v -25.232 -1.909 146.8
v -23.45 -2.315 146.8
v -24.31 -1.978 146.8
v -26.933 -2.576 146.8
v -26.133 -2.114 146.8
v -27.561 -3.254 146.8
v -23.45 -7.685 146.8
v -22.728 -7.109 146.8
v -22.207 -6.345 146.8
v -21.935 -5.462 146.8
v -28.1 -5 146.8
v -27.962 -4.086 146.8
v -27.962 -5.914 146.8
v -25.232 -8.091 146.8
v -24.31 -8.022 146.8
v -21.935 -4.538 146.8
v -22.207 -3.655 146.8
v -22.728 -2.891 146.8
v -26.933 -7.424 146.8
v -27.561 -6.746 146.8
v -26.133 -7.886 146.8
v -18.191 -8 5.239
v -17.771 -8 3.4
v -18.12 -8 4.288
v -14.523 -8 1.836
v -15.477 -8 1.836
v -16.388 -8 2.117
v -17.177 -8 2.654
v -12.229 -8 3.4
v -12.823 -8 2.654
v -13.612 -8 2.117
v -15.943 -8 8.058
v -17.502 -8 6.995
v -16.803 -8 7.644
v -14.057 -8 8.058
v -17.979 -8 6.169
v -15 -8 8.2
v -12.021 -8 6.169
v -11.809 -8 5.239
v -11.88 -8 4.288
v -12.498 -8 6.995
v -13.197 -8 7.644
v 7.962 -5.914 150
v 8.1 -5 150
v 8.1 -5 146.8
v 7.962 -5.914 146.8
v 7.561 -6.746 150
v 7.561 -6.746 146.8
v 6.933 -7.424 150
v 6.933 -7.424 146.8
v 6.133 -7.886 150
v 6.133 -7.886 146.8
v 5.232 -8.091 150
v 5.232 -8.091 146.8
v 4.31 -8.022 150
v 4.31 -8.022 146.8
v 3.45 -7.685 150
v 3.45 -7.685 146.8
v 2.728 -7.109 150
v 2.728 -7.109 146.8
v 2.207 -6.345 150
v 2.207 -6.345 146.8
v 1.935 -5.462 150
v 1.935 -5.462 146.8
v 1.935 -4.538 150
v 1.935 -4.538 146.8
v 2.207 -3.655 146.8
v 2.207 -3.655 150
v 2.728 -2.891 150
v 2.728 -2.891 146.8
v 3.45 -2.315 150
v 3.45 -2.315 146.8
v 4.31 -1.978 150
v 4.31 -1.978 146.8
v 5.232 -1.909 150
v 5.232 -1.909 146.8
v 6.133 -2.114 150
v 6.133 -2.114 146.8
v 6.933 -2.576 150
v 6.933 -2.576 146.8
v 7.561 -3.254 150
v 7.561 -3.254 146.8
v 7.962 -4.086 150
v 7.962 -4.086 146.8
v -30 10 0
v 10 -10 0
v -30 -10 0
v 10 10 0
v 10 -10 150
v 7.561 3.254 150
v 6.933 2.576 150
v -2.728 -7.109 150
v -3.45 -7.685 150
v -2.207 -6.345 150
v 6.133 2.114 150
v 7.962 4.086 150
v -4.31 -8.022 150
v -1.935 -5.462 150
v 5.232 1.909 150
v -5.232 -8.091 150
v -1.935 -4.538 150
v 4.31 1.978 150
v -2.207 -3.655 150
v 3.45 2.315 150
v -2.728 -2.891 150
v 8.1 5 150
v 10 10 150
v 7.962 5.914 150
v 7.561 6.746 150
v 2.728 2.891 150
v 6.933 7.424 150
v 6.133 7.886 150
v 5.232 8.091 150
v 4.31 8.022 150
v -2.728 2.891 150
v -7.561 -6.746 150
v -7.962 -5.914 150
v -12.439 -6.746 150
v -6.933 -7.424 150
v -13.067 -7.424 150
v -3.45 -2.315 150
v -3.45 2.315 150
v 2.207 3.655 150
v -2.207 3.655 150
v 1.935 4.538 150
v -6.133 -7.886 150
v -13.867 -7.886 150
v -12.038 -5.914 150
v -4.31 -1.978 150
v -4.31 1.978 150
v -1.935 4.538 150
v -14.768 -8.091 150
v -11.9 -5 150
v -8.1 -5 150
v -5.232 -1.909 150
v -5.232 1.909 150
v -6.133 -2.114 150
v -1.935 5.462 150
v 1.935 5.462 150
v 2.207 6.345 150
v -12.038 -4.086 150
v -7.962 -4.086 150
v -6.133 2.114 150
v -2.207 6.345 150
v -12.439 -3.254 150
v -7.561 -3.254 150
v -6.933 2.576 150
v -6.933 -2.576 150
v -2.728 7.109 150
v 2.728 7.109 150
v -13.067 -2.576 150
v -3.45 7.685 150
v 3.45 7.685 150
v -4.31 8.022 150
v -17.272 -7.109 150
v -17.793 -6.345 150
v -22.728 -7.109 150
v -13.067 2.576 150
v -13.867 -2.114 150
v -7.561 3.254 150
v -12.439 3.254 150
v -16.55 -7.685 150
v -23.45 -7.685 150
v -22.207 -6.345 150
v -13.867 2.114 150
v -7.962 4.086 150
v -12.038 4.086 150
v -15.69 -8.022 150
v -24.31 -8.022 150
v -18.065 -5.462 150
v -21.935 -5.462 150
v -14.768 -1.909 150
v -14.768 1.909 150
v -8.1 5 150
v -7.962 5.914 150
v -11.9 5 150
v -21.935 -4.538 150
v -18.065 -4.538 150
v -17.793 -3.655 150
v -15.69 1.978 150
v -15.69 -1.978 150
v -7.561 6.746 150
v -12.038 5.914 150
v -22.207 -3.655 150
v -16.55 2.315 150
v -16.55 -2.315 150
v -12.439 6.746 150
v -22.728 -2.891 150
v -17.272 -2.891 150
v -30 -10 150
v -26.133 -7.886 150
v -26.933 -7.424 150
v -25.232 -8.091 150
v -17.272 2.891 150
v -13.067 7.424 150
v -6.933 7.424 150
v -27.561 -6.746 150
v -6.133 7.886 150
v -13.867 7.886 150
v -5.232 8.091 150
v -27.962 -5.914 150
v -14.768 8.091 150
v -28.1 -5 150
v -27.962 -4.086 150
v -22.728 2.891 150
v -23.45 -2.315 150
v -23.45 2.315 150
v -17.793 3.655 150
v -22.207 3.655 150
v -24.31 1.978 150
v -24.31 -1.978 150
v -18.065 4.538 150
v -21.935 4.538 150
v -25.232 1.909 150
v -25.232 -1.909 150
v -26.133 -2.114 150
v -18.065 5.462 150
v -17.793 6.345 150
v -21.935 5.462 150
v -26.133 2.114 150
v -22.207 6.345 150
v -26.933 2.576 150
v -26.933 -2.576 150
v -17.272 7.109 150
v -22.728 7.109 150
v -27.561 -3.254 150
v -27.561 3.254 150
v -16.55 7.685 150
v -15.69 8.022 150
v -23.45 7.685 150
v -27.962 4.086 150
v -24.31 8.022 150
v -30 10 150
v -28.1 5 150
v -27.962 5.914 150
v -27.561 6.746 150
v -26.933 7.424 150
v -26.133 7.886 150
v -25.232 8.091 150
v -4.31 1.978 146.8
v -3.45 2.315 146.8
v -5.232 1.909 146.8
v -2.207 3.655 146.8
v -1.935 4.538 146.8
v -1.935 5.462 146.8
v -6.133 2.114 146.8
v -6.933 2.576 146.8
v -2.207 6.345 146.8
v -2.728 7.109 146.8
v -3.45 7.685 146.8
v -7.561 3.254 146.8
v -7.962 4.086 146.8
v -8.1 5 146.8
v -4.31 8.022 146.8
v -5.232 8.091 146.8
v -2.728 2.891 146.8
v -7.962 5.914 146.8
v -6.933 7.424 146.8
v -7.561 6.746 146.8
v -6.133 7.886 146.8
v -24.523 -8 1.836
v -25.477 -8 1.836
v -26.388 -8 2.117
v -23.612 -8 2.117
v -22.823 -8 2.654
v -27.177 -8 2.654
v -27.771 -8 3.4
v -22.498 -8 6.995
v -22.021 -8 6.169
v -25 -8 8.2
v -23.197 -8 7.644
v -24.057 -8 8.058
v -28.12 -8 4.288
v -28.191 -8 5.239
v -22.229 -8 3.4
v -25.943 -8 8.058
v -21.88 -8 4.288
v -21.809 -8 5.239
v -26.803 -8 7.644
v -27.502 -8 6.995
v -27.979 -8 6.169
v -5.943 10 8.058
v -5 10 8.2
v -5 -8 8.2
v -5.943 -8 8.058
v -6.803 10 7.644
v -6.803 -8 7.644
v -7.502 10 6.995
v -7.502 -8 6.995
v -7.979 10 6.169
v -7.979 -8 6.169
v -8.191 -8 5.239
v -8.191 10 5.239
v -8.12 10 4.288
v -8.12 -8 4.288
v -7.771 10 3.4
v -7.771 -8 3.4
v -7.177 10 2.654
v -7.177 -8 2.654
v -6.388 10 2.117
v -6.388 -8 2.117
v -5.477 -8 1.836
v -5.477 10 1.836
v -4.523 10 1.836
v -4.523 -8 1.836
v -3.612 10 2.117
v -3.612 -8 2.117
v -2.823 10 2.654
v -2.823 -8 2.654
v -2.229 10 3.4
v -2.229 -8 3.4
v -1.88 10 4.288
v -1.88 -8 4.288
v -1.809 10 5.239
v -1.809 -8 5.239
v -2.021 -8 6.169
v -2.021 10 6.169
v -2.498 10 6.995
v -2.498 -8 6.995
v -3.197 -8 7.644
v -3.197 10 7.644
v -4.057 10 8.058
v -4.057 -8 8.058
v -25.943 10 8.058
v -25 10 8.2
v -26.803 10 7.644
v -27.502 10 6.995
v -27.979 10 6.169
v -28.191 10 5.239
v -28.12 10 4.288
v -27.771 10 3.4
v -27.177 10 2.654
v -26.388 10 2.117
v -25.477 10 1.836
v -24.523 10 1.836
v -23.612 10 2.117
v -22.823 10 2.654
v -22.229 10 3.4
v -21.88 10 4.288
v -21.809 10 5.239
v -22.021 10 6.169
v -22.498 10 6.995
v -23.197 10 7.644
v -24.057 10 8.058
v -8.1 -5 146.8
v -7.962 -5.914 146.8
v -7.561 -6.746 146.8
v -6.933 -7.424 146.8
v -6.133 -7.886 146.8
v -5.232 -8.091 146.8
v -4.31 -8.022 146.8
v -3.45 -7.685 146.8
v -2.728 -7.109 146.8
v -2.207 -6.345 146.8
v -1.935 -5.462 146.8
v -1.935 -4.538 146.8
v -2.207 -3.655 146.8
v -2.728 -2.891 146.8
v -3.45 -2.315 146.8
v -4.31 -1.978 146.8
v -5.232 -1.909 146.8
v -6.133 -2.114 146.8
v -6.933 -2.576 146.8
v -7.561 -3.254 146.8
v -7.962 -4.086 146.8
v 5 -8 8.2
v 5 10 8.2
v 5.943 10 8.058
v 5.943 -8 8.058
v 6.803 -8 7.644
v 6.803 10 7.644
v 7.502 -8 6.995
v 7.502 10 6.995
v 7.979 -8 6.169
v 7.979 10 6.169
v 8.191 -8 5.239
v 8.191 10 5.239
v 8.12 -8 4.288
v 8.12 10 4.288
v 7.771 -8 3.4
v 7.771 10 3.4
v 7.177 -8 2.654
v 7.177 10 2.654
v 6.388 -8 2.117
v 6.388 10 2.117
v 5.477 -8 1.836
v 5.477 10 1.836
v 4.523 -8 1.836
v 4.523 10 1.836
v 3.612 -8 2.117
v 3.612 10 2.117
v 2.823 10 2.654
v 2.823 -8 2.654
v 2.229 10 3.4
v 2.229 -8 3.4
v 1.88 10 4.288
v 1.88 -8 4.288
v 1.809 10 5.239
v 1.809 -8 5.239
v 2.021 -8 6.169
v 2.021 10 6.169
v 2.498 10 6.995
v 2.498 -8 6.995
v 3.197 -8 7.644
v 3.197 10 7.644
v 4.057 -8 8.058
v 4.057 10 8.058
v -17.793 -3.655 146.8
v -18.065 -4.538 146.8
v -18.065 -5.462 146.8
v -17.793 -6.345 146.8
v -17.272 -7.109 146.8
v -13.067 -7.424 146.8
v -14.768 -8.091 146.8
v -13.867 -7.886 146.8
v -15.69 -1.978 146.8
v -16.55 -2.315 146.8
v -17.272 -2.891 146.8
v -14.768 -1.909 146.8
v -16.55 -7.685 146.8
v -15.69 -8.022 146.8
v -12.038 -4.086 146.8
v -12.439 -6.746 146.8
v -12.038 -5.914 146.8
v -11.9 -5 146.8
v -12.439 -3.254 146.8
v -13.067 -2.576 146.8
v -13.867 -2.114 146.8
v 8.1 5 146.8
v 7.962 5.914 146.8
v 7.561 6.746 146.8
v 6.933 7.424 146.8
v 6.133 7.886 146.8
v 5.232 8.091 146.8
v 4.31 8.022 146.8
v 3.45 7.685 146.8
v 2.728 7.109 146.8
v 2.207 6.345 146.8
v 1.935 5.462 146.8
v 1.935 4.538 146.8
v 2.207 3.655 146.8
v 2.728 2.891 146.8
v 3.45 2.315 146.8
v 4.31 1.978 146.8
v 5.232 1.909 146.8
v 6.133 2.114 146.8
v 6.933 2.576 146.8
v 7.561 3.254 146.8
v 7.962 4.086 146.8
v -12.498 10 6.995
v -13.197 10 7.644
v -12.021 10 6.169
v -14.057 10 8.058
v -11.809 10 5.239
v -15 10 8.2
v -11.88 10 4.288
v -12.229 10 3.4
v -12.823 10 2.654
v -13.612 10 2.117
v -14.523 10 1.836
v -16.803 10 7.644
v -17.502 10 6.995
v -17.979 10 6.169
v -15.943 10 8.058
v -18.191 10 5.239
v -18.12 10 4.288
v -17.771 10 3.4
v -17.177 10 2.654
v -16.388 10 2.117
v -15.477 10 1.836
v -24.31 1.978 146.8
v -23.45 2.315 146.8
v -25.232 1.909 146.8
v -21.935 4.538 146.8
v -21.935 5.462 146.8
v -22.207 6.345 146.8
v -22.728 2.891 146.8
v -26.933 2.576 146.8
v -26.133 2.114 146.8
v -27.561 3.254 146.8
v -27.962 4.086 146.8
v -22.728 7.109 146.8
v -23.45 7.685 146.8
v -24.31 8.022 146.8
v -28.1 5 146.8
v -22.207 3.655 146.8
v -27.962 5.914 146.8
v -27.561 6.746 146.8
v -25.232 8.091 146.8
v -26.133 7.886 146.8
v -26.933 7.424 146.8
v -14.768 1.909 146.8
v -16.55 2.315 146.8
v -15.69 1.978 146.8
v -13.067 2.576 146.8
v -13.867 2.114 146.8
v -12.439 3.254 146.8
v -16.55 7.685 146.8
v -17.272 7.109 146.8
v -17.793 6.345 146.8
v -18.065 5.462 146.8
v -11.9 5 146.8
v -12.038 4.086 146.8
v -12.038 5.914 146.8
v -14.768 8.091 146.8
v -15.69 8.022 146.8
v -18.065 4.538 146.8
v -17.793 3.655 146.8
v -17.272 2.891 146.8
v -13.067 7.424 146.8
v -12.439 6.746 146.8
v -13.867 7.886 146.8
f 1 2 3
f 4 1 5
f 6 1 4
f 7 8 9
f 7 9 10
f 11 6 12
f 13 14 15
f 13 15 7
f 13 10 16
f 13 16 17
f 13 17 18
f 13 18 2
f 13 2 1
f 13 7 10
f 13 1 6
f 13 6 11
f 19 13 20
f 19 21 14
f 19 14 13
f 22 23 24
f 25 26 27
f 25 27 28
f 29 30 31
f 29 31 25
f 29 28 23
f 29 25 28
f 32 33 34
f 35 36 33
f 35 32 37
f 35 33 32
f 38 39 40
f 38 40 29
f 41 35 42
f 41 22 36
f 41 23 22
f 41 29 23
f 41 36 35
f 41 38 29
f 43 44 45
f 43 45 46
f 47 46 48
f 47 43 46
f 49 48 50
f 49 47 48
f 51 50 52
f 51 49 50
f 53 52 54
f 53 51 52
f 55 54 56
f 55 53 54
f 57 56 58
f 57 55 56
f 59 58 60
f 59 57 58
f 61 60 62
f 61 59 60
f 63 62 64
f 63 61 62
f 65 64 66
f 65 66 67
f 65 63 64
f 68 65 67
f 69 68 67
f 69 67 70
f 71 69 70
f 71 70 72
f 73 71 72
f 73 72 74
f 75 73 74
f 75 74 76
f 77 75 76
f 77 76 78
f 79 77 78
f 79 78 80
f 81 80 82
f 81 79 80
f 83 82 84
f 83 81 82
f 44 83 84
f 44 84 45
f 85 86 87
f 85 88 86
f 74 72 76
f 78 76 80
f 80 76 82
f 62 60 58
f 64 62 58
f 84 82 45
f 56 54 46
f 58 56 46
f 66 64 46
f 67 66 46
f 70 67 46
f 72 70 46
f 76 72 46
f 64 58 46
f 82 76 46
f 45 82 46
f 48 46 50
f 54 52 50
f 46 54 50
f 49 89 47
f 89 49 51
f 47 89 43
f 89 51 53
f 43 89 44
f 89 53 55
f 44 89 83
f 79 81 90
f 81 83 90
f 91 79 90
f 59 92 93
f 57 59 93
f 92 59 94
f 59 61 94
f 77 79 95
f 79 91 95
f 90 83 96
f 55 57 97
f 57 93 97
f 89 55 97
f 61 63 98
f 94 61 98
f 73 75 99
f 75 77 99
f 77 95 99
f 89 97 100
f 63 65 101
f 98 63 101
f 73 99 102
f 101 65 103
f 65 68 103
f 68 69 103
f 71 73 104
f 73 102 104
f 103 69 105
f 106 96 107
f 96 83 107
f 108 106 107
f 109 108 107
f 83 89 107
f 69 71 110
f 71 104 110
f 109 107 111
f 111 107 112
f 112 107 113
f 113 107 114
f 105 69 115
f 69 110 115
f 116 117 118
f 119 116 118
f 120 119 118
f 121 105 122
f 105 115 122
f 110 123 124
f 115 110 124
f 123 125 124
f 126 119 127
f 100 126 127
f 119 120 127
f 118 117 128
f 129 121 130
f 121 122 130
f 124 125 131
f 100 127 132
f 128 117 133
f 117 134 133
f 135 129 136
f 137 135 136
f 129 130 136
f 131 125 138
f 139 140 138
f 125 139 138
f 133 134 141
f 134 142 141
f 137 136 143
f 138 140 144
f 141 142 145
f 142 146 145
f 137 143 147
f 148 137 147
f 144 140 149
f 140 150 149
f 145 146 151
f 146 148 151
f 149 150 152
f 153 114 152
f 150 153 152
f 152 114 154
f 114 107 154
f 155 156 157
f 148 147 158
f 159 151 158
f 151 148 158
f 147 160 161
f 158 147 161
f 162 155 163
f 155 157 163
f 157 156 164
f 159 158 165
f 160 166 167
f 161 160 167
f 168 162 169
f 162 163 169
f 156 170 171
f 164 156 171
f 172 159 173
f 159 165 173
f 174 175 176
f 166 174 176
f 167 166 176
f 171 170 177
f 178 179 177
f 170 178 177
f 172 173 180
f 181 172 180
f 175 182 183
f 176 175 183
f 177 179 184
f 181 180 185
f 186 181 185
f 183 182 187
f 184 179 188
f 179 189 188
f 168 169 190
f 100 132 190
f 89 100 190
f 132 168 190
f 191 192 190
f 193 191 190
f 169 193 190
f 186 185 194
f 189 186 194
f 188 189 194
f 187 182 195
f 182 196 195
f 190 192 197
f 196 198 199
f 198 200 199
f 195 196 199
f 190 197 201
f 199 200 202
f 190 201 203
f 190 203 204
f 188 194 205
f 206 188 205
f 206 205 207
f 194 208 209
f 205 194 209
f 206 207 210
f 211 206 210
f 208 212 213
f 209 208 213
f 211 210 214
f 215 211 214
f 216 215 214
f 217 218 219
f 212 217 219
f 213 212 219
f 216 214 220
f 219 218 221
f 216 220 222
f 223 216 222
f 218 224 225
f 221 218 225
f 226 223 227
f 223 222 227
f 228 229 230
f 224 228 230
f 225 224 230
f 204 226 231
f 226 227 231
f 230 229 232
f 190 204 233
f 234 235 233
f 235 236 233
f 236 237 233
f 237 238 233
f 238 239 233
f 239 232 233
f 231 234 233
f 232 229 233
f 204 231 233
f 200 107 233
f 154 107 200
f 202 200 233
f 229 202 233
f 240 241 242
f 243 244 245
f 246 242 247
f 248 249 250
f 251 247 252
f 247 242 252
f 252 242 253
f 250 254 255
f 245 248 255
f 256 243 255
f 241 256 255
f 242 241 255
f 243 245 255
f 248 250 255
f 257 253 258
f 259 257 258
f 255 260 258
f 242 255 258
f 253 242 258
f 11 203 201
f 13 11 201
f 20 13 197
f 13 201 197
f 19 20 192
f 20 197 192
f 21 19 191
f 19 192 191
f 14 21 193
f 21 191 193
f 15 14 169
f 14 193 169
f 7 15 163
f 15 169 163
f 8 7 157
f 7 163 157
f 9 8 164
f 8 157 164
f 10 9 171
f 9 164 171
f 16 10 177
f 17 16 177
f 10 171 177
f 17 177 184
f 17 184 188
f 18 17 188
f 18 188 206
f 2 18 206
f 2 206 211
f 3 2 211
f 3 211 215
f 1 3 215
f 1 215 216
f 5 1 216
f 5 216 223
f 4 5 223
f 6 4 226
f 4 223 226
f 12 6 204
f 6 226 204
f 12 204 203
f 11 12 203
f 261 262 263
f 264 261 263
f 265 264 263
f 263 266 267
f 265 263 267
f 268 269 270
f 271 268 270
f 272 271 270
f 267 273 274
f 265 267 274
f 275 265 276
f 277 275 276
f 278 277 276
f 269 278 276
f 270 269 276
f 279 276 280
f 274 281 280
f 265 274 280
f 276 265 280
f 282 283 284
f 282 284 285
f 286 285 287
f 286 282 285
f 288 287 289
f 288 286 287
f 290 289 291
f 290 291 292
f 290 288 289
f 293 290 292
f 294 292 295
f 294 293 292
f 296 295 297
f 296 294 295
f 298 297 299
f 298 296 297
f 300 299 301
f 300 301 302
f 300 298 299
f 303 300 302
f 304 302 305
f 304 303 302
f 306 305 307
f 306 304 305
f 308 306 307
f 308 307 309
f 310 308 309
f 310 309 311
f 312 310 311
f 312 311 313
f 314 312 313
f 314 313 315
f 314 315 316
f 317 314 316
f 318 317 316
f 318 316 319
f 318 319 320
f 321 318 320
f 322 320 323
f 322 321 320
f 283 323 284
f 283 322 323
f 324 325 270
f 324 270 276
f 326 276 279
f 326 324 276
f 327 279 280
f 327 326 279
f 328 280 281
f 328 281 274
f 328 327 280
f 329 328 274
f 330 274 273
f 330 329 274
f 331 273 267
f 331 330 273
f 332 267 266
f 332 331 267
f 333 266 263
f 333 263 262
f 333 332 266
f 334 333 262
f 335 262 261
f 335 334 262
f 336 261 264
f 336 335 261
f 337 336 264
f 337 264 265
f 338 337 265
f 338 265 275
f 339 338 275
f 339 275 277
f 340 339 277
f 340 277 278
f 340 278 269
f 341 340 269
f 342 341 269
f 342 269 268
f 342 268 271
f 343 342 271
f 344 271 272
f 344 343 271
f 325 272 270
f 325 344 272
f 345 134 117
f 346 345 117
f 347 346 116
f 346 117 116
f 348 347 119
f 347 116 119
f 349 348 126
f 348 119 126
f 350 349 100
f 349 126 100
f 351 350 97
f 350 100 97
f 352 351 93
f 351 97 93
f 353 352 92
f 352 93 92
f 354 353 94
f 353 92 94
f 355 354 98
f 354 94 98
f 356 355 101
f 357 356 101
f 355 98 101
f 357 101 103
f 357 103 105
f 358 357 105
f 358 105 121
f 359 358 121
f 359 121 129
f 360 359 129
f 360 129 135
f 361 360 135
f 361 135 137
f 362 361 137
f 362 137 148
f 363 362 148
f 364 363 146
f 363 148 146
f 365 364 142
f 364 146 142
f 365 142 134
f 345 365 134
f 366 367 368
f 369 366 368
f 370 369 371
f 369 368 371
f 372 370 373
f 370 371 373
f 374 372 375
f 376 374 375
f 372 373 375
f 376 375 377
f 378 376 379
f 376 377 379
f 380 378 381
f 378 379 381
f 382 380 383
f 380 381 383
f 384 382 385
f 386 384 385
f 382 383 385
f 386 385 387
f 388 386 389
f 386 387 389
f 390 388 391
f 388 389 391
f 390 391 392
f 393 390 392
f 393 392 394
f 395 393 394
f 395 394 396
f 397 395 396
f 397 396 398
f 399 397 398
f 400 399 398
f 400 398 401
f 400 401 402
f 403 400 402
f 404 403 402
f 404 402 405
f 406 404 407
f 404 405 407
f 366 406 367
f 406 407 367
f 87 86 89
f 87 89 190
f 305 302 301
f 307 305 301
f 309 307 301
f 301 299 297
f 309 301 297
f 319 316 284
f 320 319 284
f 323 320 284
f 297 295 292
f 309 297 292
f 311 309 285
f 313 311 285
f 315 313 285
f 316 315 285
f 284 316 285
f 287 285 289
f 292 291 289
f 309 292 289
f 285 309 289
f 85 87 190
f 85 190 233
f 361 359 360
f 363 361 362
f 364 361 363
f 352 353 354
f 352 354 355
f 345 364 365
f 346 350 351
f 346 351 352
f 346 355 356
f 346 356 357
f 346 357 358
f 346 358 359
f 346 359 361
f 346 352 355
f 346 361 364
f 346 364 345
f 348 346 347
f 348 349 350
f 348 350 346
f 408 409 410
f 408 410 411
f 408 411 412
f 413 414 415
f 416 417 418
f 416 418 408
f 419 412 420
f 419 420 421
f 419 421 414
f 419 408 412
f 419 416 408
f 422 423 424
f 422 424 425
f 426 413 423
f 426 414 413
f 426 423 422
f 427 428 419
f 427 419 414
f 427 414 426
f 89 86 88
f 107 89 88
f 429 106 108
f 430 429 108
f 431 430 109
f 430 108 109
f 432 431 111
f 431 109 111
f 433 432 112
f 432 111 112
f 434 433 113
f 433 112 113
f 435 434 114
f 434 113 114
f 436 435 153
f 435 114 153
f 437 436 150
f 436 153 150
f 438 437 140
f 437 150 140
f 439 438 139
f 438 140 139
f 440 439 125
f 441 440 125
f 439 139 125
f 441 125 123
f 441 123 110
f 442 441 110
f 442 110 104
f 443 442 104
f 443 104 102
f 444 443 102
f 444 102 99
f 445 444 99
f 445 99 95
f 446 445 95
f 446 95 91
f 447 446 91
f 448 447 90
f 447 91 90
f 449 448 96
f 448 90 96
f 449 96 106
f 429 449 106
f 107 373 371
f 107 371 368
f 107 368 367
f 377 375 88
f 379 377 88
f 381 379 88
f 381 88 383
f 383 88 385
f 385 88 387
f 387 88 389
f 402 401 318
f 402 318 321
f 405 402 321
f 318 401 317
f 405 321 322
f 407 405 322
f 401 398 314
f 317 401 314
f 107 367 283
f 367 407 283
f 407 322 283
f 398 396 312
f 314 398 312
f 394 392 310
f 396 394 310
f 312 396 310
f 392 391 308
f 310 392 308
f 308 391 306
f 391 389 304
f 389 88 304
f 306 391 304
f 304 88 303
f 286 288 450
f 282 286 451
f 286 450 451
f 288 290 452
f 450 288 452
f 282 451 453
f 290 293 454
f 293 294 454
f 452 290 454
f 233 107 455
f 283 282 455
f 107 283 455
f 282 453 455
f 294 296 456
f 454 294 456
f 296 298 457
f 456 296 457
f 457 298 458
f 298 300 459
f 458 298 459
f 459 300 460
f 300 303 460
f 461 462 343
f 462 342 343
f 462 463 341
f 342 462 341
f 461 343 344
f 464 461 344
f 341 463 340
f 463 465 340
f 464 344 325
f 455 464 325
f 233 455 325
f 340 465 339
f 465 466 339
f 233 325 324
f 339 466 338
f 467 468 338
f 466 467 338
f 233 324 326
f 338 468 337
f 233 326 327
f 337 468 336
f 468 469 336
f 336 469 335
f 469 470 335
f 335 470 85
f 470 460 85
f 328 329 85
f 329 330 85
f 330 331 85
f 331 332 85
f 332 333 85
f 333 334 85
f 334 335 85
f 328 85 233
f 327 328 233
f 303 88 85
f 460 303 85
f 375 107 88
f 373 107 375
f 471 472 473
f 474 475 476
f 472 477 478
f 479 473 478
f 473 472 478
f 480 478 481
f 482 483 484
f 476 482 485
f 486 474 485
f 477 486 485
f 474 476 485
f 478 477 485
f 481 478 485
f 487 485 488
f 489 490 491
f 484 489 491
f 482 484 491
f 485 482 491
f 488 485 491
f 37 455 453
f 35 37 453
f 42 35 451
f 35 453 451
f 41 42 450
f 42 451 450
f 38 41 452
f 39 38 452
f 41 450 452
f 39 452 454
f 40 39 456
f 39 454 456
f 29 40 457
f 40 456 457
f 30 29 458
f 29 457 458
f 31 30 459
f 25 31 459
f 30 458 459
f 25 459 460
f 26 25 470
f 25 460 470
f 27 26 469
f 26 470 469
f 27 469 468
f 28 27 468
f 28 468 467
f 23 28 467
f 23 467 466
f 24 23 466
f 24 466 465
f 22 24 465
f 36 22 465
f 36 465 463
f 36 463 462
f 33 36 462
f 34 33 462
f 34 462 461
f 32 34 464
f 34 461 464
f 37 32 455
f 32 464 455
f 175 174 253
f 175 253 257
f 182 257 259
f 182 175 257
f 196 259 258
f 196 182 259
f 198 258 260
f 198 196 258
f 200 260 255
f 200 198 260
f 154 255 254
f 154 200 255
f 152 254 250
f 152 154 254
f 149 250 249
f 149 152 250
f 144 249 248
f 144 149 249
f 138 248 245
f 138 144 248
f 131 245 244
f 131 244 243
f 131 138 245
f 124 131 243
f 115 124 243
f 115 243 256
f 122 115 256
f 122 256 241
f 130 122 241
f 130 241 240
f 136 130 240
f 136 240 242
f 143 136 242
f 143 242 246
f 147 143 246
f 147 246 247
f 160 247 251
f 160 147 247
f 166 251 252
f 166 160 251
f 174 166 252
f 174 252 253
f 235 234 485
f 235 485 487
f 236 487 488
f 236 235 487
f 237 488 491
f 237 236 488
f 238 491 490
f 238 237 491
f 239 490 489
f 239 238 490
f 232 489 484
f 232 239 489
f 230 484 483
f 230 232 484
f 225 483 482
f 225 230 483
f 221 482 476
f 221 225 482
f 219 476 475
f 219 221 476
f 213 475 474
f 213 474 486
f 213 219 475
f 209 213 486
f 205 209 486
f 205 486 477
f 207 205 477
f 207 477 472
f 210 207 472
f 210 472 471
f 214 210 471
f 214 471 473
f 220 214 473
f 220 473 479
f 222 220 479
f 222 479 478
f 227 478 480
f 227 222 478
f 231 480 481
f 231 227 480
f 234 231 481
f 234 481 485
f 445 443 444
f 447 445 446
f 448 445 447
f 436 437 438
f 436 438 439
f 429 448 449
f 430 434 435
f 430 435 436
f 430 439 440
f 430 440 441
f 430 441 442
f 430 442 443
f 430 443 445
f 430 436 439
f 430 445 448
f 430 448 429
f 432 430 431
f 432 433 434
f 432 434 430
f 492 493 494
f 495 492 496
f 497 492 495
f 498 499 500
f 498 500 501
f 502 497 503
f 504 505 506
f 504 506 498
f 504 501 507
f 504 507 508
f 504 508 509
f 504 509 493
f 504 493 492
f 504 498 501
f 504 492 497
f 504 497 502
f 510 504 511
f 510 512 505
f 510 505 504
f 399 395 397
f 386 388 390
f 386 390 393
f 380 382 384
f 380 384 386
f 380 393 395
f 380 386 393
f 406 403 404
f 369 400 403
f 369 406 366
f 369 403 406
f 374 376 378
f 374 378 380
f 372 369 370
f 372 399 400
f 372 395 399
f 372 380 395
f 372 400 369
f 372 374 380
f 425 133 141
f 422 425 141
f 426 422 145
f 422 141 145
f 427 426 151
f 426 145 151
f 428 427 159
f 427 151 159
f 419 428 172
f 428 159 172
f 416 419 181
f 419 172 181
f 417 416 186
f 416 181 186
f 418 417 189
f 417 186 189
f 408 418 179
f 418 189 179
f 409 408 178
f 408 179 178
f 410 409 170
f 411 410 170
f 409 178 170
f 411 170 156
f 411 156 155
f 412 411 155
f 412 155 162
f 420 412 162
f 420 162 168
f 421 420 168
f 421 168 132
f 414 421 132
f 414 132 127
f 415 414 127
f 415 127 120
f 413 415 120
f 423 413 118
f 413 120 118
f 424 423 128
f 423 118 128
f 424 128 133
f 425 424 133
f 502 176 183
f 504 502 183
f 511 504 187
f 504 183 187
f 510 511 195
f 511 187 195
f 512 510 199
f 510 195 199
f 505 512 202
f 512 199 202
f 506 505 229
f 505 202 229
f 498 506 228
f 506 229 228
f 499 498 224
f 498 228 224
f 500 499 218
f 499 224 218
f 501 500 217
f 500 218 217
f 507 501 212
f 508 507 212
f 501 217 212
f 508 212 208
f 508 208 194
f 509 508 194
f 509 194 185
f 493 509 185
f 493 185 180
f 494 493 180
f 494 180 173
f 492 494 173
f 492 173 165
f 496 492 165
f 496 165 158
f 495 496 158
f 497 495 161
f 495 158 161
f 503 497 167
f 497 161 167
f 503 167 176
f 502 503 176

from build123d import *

# Parameters (mm, degrees)
SKETCH_1_W               = 20
SKETCH_1_H               = 20
EXTRUDE_1_DEPTH          = 150
SKETCH_3_R               = 3.2
CUT_EXTRUDE_2_DEPTH      = 18
SKETCH_4_R               = 3.1
CUT_EXTRUDE_3_DEPTH      = 3.2
MIRROR_3_COPY_1_SKETCH_R = 3.1
MIRROR_3_COPY_1_DEPTH    = 3.2
MIRROR_4_COPY_1_SKETCH_R = 3.2
MIRROR_4_COPY_1_DEPTH    = 18
MIRROR_4_COPY_2_SKETCH_R = 3.1
MIRROR_4_COPY_2_DEPTH    = 3.2
MIRROR_4_COPY_3_SKETCH_R = 3.1
MIRROR_4_COPY_3_DEPTH    = 3.2
MIRROR_4_COPY_4_SKETCH_R = 3.1
MIRROR_4_COPY_4_DEPTH    = 3.2


with BuildPart() as part:
    # ｽｹｯﾁ1 → ﾎﾞｽ - 押し出し1 (new body)
    with BuildSketch(Plane.XY):
        Rectangle(SKETCH_1_W, SKETCH_1_H)
    extrude_1 = extrude(amount=EXTRUDE_1_DEPTH)

    # ｽｹｯﾁ3 → ｶｯﾄ - 押し出し2 (cut)
    with BuildSketch(Plane(origin=(0, 10, 0), x_dir=(1, 0, 0), z_dir=(0, 1, 0))):
        with Locations(Location((5, -5, 0), (0, 0, 270))):
            Circle(SKETCH_3_R)
    cut_extrude_2 = extrude(amount=-CUT_EXTRUDE_2_DEPTH, mode=Mode.SUBTRACT)

    # ﾐﾗｰ1: ｶｯﾄ - 押し出し2 across plane
    add(cut_extrude_2.mirror(Plane(origin=(0, 0, 0), x_dir=(0, 0, 1), z_dir=(1, 0, 0))), mode=Mode.SUBTRACT)

    # ｽｹｯﾁ4 → ｶｯﾄ - 押し出し3 (cut)
    with BuildSketch(Plane.XY.offset(150)):
        with Locations((5, 5)):
            Circle(SKETCH_4_R)
    cut_extrude_3 = extrude(amount=-CUT_EXTRUDE_3_DEPTH, mode=Mode.SUBTRACT)

    # ﾐﾗｰ2: ｶｯﾄ - 押し出し3 across plane
    add(cut_extrude_3.mirror(Plane.ZX), mode=Mode.SUBTRACT)

    # ﾐﾗｰ3: ｶｯﾄ - 押し出し3 across plane
    add(cut_extrude_3.mirror(Plane(origin=(0, 0, 0), x_dir=(0, 0, 1), z_dir=(1, 0, 0))), mode=Mode.SUBTRACT)

    # ﾐﾗｰ3 copy 1 sketch → ﾐﾗｰ3 copy 1 (cut)
    with BuildSketch(Plane(origin=(0, 0, 150), x_dir=(-1, 0, 0), z_dir=(0, 0, 1))):
        with Locations((5, 5)):
            Circle(MIRROR_3_COPY_1_SKETCH_R)
    extrude(amount=-MIRROR_3_COPY_1_DEPTH, mode=Mode.SUBTRACT)

    # ﾐﾗｰ4: ﾎﾞｽ - 押し出し1, ｶｯﾄ - 押し出し2, ｶｯﾄ - 押し出し3 across plane
    add(extrude_1.mirror(Plane(origin=(-10, 10, 150), x_dir=(0, 0, 1), z_dir=(1, 0, 0))))
    add(cut_extrude_2.mirror(Plane(origin=(-10, 10, 150), x_dir=(0, 0, 1), z_dir=(1, 0, 0))), mode=Mode.SUBTRACT)
    add(cut_extrude_3.mirror(Plane(origin=(-10, 10, 150), x_dir=(0, 0, 1), z_dir=(1, 0, 0))), mode=Mode.SUBTRACT)

    # ﾐﾗｰ4 copy 1 sketch → ﾐﾗｰ4 copy 1 (cut)
    with BuildSketch(Plane(origin=(-20, 10, 0), x_dir=(1, 0, 0), z_dir=(0, 1, 0))):
        with Locations(Location((5, -5, 0), (0, 0, 270))):
            Circle(MIRROR_4_COPY_1_SKETCH_R)
    extrude(amount=-MIRROR_4_COPY_1_DEPTH, mode=Mode.SUBTRACT)

    # ﾐﾗｰ4 copy 2 sketch → ﾐﾗｰ4 copy 2 (cut)
    with BuildSketch(Plane(origin=(-20, 0, 150), x_dir=(-1, 0, 0), z_dir=(0, 0, 1))):
        with Locations((5, 5)):
            Circle(MIRROR_4_COPY_2_SKETCH_R)
    extrude(amount=-MIRROR_4_COPY_2_DEPTH, mode=Mode.SUBTRACT)

    # ﾐﾗｰ4 copy 3 sketch → ﾐﾗｰ4 copy 3 (cut)
    with BuildSketch(Plane(origin=(-20, 0, 150), x_dir=(1, 0, 0), z_dir=(0, 0, 1))):
        with Locations((5, 5)):
            Circle(MIRROR_4_COPY_3_SKETCH_R)
    extrude(amount=-MIRROR_4_COPY_3_DEPTH, mode=Mode.SUBTRACT)

    # ﾐﾗｰ4 copy 4 sketch → ﾐﾗｰ4 copy 4 (cut)
    with BuildSketch(Plane(origin=(-20, 0, 150), x_dir=(1, 0, 0), z_dir=(0, 0, 1))):
        with Locations((5, -5)):
            Circle(MIRROR_4_COPY_4_SKETCH_R)
    extrude(amount=-MIRROR_4_COPY_4_DEPTH, mode=Mode.SUBTRACT)


solid = part.part
